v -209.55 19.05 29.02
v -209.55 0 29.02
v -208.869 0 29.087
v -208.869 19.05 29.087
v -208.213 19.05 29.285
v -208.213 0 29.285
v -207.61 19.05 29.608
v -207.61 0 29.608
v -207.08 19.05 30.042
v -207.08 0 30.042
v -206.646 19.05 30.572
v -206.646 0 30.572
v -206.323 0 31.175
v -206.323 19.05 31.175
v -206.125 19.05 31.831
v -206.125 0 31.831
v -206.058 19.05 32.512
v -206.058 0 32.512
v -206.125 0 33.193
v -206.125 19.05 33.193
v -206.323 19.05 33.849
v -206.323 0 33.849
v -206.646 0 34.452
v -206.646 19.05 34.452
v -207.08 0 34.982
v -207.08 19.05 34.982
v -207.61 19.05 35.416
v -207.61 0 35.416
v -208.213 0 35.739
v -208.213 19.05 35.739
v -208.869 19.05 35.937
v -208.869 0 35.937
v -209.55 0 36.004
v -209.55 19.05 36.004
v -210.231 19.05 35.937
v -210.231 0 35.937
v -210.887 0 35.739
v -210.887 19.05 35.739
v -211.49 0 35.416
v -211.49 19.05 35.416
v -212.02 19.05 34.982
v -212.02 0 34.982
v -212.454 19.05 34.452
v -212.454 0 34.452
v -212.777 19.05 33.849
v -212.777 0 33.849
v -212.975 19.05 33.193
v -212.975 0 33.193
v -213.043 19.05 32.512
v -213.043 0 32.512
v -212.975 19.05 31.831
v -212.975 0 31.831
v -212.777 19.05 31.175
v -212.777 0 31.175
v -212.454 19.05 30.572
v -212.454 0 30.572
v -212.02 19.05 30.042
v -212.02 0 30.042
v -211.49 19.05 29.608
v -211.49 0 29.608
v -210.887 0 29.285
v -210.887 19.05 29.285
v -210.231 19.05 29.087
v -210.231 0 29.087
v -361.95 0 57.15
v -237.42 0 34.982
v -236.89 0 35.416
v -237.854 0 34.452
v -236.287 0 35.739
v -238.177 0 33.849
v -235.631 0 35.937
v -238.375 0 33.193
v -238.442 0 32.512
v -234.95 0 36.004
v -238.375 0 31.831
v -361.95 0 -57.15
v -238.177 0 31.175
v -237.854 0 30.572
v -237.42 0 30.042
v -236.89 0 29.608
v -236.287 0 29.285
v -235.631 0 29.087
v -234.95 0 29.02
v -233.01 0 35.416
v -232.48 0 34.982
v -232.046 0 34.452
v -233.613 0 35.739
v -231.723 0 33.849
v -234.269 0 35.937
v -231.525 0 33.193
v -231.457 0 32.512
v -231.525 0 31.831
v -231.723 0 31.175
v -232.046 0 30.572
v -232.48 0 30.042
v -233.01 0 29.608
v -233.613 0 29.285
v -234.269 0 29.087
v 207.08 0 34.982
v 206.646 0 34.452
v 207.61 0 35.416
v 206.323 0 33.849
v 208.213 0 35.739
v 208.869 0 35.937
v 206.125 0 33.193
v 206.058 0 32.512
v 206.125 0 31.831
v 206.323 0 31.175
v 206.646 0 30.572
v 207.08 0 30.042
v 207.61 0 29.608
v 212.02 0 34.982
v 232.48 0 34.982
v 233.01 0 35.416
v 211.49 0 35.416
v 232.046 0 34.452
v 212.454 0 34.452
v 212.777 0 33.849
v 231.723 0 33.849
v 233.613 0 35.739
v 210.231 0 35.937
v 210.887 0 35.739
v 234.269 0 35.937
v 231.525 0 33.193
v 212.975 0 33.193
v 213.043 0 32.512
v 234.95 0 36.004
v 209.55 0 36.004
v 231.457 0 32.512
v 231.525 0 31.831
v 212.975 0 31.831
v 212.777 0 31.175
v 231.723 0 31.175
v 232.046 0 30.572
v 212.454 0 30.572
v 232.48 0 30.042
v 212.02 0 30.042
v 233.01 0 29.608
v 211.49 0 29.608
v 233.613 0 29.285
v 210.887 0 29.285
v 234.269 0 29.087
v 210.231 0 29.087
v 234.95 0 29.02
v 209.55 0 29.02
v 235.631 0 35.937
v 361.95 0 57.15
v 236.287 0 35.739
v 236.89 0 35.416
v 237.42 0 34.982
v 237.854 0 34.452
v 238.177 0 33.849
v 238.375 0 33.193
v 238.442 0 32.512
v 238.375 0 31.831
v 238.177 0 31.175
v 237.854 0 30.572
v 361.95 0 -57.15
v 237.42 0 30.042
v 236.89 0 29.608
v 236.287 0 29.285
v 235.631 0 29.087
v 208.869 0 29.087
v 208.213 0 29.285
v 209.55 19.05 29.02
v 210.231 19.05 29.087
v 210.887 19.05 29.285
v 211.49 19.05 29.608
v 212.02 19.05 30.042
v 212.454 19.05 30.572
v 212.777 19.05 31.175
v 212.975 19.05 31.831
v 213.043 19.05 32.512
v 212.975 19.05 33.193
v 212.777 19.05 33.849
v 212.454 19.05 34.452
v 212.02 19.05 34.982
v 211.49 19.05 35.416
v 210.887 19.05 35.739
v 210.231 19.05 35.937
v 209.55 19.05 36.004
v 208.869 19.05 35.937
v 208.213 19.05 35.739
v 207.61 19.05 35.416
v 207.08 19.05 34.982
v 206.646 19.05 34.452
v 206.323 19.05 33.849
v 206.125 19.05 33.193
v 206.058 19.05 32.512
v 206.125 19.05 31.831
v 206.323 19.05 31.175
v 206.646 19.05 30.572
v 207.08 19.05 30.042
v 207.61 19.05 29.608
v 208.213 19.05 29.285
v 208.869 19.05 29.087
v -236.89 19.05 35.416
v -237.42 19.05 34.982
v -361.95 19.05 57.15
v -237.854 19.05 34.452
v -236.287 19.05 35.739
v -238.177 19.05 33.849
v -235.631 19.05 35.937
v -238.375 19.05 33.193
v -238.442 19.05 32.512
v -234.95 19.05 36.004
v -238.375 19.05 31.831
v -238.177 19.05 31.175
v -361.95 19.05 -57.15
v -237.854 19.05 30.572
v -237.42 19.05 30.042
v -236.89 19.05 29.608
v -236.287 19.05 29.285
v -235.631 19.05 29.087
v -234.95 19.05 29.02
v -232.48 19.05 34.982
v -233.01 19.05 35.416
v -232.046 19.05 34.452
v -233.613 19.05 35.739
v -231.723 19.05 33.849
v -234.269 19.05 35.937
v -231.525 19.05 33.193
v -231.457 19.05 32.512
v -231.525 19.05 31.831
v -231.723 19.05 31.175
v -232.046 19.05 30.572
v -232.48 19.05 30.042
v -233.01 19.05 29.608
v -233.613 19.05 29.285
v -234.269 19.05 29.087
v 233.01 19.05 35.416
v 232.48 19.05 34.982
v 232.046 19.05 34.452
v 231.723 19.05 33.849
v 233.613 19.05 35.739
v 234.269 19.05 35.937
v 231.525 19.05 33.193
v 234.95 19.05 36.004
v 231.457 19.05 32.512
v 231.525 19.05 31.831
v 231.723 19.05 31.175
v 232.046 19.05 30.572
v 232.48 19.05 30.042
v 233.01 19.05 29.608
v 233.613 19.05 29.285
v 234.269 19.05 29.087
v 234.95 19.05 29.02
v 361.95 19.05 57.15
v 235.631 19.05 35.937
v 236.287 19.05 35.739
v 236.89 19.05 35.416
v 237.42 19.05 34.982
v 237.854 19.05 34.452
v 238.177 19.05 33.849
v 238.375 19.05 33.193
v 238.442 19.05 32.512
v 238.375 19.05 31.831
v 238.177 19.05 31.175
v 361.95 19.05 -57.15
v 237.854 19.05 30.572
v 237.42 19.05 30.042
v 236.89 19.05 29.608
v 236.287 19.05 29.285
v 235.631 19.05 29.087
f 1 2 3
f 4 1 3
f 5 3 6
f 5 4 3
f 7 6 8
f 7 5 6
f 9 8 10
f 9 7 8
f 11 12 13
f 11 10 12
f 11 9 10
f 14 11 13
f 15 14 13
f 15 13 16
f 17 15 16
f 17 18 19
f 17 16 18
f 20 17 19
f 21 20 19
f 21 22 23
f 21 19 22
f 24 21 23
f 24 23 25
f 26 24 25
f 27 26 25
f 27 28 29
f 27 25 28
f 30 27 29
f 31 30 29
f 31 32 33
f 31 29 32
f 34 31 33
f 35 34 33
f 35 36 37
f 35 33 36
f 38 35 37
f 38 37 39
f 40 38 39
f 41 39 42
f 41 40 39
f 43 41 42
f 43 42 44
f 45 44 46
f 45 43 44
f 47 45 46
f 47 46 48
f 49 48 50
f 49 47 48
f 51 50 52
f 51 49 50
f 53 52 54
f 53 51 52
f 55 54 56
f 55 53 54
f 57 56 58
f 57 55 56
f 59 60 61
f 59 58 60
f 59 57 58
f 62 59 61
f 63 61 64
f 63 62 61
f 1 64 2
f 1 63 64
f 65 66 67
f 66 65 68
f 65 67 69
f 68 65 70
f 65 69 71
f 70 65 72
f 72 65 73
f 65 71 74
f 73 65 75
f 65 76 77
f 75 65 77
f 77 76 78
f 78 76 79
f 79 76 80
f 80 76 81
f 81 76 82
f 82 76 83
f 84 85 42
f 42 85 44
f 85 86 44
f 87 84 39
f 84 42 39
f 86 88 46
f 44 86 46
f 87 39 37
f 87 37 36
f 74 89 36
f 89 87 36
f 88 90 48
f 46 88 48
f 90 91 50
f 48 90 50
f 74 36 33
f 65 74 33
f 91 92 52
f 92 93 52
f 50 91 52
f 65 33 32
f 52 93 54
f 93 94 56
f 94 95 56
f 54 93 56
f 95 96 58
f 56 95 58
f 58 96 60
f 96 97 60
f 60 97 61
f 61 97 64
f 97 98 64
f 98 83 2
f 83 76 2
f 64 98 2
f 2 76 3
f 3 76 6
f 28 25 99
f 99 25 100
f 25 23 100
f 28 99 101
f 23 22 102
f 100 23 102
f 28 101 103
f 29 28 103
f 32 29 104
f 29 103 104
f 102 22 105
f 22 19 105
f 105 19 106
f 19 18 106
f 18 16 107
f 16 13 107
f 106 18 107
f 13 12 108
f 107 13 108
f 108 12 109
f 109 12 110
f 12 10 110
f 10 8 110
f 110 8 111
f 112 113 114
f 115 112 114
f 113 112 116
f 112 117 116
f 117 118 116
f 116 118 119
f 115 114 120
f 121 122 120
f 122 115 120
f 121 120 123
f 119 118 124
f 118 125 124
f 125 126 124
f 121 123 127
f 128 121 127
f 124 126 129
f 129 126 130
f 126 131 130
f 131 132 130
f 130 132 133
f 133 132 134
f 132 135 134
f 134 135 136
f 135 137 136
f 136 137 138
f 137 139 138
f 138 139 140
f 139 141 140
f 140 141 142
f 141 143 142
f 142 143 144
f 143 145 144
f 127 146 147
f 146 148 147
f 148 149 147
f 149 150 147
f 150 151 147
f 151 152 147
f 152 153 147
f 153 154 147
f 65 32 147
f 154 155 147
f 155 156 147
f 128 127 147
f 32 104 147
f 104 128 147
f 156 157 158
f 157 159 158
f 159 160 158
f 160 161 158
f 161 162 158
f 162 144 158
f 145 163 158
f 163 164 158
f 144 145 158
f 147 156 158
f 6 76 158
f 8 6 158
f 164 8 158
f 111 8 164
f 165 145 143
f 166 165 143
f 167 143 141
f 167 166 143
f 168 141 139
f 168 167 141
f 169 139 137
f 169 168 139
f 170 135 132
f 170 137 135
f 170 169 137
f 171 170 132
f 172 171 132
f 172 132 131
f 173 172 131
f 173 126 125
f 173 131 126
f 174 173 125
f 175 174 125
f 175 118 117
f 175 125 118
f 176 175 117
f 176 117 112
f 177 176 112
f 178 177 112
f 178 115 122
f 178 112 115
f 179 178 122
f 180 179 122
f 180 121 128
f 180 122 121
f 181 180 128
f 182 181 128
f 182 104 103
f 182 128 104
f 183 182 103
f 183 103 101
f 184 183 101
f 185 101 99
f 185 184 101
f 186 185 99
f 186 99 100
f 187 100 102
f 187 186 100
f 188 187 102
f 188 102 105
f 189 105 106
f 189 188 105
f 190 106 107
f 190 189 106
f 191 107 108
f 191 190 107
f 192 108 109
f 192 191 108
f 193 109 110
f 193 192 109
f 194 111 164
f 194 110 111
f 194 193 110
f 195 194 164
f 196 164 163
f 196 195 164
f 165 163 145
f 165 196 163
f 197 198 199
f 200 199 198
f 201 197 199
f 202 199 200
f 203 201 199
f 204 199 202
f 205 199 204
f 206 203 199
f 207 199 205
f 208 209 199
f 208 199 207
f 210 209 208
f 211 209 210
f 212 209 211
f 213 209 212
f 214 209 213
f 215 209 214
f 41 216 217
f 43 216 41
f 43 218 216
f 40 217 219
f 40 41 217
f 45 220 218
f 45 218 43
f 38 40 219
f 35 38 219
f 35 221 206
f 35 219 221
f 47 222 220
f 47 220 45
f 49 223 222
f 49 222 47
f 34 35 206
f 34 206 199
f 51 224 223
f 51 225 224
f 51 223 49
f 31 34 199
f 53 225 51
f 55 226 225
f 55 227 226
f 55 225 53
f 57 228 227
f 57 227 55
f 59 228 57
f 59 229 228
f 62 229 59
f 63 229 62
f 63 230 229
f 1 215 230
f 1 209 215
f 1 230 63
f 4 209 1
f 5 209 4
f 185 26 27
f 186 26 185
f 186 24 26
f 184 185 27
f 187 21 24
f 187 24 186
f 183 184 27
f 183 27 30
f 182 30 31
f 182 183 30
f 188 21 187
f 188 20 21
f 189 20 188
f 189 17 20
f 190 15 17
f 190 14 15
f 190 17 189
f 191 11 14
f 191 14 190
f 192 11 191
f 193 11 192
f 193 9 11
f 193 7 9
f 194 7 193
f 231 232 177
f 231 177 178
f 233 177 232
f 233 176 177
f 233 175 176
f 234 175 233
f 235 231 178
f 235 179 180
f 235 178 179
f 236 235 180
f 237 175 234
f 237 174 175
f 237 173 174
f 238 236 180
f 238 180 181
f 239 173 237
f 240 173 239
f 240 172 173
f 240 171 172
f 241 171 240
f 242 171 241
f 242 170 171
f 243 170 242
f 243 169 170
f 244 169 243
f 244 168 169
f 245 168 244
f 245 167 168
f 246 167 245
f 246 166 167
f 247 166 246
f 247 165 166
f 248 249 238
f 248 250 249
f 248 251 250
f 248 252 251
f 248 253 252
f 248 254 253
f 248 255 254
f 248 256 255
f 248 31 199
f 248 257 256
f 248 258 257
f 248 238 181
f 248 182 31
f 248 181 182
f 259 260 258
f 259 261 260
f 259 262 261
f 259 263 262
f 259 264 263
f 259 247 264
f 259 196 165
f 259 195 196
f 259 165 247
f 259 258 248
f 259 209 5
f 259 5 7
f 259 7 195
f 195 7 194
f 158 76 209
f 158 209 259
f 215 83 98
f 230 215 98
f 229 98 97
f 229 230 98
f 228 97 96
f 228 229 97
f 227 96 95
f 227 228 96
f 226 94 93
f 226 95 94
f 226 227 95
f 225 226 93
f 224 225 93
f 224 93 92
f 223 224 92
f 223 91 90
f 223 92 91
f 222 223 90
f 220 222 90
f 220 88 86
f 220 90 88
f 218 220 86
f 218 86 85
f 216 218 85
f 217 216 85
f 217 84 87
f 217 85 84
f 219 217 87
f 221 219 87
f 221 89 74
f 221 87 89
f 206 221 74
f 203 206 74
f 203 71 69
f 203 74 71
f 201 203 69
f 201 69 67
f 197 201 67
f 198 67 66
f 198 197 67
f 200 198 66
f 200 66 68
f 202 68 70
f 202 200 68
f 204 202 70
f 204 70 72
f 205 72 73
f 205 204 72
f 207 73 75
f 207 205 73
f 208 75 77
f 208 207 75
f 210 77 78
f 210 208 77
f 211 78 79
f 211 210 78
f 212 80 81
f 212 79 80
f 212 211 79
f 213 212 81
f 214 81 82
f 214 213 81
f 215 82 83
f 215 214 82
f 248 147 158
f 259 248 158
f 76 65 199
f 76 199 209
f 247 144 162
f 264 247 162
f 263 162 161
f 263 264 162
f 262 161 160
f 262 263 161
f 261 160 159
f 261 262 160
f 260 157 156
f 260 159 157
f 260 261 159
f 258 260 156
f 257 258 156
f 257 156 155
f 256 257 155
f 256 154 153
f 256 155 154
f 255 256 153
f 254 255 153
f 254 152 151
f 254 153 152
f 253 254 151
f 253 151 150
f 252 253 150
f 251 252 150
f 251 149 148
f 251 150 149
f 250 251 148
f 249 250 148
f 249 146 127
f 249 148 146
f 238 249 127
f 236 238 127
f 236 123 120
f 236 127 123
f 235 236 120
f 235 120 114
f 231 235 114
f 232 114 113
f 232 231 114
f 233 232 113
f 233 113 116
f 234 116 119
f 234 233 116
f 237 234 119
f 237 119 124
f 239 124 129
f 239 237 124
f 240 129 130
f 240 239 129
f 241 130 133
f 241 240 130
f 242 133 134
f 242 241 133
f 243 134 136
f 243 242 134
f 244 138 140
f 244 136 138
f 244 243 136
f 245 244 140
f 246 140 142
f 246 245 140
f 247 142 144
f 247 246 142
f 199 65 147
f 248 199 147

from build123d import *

# Parameters (mm, degrees)
SKETCH2_W               = 723.9
SKETCH2_H               = 114.3
BOSS_EXTRUDE3_DEPTH     = 19.05
CUT_EXTRUDE1_DEPTH      = 367.928913415
CUT_EXTRUDE1_DEPTH_BACK = 367.928913415
SKETCH3_R               = 3.4925


with BuildPart() as part:
    # Sketch2 → Boss-Extrude3 (new body)
    with BuildSketch(Plane(origin=(0, 0, 0), x_dir=(1, 0, 0), z_dir=(0, 1, 0))):
        Rectangle(SKETCH2_W, SKETCH2_H)
    extrude(amount=BOSS_EXTRUDE3_DEPTH)

    # Sketch3 → Cut-Extrude1 (cut, two sides: drawn at the far end of the back side and taken through both)
    with BuildSketch(Plane.XZ.offset(-CUT_EXTRUDE1_DEPTH_BACK)):
        with Locations(Location((-234.95, 32.512, 0), (0, 0, 270))):
            Circle(SKETCH3_R)
        with Locations(Location((-209.55, 32.512, 0), (0, 0, 270))):
            Circle(SKETCH3_R)
        with Locations(Location((209.55, 32.512, 0), (0, 0, 270))):
            Circle(SKETCH3_R)
        with Locations(Location((234.95, 32.512, 0), (0, 0, 270))):
            Circle(SKETCH3_R)
    extrude(amount=CUT_EXTRUDE1_DEPTH + CUT_EXTRUDE1_DEPTH_BACK, mode=Mode.SUBTRACT)


solid = part.part
